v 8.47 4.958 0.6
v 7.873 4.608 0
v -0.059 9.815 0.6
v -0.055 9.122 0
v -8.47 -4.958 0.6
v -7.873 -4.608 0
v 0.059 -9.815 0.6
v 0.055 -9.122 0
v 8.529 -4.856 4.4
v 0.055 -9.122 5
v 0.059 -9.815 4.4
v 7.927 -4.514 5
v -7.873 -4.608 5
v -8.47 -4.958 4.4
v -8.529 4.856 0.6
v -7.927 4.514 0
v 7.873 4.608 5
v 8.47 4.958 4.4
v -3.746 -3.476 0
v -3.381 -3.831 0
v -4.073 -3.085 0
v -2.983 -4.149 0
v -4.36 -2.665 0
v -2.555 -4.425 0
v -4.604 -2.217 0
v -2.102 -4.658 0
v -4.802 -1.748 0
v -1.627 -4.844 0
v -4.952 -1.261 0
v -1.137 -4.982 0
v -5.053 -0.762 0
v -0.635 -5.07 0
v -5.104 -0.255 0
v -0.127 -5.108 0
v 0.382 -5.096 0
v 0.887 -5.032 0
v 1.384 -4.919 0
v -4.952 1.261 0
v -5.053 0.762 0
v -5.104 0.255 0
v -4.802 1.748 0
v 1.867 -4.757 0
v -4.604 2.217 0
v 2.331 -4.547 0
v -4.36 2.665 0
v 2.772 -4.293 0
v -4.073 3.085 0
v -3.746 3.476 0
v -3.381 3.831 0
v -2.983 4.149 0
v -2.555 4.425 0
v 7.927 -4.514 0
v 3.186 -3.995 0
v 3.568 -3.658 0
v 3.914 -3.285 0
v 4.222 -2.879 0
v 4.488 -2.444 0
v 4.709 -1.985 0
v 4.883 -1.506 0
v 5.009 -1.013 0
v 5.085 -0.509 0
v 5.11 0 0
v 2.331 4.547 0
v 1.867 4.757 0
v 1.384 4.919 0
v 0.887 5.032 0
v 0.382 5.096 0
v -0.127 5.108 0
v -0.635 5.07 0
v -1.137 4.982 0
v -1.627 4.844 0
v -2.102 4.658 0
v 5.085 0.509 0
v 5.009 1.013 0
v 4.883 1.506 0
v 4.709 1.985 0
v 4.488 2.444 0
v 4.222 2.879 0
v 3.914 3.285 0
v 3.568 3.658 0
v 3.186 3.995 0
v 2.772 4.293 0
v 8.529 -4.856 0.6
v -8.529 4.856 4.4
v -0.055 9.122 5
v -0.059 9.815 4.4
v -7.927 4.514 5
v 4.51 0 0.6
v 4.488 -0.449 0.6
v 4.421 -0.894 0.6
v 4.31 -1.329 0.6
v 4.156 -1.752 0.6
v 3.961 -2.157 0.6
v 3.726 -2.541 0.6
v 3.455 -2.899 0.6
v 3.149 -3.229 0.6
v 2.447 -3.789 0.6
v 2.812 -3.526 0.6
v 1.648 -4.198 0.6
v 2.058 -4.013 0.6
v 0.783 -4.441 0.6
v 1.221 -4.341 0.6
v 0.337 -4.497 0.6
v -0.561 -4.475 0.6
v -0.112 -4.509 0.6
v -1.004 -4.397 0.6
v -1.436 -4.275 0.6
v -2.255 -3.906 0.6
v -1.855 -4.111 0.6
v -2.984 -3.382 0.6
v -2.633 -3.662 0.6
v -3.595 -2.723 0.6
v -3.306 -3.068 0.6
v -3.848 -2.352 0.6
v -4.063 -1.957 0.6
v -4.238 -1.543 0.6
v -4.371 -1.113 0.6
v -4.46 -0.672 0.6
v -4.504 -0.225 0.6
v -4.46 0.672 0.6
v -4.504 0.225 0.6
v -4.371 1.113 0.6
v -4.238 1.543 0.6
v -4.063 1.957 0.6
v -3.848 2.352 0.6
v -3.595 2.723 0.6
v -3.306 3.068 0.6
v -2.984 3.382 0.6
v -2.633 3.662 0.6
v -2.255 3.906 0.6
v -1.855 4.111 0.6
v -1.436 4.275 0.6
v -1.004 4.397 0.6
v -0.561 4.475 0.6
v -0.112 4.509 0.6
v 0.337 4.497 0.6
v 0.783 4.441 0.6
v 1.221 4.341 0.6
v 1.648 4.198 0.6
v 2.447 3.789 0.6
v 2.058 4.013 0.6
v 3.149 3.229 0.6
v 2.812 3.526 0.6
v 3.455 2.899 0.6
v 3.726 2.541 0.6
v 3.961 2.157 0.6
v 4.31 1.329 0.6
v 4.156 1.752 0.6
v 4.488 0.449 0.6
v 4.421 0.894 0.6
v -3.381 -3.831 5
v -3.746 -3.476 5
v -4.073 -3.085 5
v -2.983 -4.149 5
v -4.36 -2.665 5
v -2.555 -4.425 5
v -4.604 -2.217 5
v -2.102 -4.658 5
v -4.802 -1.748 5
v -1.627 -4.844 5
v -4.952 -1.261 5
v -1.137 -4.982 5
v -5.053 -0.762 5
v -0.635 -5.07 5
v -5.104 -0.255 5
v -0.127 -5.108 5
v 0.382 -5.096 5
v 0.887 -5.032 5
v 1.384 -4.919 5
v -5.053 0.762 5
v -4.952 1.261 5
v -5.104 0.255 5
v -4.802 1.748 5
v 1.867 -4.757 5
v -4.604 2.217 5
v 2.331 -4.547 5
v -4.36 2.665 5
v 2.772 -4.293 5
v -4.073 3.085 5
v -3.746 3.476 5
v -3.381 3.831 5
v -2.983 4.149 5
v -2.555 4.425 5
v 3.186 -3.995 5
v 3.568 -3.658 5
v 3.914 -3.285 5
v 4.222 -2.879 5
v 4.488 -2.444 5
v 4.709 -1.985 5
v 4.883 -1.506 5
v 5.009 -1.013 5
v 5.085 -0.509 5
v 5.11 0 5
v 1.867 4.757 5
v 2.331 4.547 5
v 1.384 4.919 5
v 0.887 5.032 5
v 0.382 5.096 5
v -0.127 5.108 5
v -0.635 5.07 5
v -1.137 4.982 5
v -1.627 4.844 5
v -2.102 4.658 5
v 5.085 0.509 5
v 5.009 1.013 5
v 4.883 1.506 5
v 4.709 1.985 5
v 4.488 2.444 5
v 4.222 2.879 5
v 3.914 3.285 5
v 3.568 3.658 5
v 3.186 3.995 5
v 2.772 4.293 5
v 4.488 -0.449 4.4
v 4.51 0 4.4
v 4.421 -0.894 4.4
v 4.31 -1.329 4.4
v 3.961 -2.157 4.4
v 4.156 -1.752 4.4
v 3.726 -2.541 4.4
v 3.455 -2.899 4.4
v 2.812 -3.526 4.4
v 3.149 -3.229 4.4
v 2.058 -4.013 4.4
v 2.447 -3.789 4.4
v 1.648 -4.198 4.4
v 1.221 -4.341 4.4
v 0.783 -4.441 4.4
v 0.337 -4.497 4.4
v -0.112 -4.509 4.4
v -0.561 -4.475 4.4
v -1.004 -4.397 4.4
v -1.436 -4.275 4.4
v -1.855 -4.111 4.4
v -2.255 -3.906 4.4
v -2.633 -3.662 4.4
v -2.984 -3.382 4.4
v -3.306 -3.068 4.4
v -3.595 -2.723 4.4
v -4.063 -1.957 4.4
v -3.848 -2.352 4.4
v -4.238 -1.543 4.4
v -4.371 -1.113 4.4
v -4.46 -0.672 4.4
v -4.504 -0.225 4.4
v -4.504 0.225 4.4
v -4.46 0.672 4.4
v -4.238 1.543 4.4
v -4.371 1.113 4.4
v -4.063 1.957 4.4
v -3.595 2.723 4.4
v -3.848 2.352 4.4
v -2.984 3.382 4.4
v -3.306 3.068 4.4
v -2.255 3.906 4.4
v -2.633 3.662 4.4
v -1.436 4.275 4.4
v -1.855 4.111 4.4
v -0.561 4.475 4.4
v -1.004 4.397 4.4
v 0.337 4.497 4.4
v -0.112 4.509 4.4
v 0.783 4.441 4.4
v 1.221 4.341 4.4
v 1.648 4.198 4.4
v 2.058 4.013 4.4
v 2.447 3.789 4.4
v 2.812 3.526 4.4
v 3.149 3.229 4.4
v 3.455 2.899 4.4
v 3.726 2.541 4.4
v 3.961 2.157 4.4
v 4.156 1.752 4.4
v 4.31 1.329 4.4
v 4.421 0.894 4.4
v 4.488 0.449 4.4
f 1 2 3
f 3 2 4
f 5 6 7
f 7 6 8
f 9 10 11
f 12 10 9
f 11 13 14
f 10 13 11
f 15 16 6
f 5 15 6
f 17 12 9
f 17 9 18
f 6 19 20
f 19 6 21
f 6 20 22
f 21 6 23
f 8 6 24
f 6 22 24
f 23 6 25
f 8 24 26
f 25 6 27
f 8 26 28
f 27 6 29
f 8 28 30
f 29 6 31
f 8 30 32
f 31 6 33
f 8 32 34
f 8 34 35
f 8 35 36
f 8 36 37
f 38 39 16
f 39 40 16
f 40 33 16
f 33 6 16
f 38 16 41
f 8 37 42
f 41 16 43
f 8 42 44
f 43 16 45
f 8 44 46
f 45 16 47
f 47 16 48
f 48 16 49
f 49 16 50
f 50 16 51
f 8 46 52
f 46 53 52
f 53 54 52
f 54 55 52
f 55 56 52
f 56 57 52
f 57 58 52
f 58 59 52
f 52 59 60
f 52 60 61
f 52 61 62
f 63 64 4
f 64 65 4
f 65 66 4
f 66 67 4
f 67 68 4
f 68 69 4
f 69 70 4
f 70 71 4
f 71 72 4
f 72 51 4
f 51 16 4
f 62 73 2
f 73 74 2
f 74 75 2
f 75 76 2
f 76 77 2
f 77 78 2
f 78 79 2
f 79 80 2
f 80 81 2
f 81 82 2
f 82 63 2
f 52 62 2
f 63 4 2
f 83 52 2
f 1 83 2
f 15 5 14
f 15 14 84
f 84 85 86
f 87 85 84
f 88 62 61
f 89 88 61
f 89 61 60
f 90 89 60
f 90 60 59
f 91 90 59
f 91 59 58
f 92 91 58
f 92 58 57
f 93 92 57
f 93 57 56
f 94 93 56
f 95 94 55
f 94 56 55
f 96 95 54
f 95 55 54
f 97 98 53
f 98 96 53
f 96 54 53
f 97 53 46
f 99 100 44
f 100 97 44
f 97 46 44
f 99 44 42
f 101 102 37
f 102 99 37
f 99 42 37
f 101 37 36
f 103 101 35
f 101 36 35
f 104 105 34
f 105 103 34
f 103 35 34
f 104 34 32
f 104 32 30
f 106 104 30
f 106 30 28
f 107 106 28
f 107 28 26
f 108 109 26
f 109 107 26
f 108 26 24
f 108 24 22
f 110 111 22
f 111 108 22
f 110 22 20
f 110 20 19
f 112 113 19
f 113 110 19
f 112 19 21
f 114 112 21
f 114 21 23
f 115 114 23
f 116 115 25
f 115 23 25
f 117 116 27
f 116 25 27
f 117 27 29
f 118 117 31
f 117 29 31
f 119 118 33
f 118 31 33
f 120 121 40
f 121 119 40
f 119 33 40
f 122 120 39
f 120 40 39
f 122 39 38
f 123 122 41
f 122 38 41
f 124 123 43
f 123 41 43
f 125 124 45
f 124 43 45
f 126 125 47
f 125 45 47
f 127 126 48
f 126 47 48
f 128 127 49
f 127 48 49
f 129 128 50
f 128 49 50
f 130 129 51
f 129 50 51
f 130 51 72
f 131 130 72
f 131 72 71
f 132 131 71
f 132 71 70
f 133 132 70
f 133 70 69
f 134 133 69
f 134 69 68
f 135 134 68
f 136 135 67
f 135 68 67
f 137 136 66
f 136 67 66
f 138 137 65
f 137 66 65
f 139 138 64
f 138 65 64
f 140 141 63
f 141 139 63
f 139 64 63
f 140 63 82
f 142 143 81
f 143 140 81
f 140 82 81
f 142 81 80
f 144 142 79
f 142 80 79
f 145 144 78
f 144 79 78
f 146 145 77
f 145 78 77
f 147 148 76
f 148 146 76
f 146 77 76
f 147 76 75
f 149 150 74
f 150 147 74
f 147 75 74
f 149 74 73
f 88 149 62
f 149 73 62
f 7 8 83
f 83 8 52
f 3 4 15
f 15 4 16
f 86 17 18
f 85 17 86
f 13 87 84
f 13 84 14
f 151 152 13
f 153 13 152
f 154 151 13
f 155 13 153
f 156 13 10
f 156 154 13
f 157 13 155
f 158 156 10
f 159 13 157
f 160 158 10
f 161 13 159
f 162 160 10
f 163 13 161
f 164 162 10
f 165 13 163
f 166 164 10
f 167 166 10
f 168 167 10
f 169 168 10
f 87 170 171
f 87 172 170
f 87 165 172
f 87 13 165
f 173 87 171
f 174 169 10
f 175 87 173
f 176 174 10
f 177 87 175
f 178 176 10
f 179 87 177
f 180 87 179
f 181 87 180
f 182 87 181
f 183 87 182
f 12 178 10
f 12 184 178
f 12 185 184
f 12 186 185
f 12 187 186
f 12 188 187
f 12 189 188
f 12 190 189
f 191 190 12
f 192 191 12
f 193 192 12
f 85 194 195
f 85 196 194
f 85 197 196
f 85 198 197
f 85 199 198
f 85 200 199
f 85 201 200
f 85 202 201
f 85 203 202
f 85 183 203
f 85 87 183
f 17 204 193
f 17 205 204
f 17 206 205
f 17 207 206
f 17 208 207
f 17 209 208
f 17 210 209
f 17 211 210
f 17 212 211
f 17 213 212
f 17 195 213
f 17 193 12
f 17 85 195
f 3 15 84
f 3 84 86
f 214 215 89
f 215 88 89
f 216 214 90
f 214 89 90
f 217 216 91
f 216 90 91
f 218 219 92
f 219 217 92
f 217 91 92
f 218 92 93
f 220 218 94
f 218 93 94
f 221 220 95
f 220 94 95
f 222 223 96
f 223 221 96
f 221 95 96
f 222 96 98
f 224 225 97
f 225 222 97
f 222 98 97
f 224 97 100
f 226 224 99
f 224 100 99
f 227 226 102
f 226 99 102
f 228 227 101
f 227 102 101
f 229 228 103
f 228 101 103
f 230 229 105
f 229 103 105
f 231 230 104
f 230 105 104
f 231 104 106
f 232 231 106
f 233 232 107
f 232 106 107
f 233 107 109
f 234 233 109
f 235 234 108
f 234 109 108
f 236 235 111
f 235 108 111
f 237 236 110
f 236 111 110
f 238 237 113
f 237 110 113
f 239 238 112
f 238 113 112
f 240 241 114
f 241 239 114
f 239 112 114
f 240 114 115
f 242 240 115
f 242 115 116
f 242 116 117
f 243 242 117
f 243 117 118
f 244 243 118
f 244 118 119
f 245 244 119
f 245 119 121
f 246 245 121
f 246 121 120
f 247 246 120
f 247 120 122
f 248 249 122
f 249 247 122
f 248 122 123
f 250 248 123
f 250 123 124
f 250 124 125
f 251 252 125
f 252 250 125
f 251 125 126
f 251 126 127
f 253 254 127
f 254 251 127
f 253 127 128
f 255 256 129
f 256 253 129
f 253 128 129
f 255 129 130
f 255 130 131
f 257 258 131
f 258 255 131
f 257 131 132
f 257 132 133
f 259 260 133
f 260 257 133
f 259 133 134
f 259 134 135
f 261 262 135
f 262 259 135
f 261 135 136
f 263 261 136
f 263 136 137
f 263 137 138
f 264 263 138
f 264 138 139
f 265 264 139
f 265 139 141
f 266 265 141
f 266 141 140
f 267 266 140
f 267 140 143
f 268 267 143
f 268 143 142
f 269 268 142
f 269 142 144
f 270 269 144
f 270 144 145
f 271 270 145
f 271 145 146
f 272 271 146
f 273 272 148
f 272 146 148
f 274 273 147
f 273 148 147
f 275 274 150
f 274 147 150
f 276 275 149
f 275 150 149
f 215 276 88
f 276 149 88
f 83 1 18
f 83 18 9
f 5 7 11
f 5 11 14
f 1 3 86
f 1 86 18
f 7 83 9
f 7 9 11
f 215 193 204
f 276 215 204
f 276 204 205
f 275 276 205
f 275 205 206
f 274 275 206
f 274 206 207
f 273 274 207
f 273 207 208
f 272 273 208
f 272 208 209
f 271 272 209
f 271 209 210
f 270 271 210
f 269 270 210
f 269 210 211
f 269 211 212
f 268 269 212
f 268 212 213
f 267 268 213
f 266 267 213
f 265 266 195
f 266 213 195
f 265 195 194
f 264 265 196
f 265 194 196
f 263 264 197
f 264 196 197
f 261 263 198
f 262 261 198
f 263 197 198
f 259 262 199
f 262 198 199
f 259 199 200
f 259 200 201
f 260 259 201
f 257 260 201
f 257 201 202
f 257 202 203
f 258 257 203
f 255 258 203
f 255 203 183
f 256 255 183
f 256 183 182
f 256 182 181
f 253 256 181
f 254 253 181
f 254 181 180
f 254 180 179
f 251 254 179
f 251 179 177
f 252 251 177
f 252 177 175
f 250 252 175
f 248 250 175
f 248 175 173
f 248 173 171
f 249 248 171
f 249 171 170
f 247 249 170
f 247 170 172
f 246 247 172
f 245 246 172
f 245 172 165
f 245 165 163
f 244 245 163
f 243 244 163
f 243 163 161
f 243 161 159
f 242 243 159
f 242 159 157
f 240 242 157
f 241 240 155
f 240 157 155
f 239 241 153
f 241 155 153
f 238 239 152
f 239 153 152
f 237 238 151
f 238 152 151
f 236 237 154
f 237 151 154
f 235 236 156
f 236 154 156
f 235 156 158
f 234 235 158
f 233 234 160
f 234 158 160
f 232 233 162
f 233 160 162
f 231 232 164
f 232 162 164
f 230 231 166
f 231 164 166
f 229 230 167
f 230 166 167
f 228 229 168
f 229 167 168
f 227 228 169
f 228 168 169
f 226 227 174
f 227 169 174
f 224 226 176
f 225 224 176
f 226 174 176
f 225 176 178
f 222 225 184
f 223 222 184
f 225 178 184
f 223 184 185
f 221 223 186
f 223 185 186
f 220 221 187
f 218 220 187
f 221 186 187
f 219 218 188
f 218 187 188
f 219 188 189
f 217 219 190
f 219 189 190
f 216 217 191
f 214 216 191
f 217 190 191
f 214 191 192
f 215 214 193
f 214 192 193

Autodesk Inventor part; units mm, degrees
ref_plane "YZ Plane" through (0, 0, 0) normal (1, 0, 0) x (0, 1, 0)
ref_plane "XZ Plane" through (0, 0, 0) normal (0, 1, 0) x (-1, 0, 0)
ref_plane "XY Plane" through (0, 0, 0) normal (0, 0, 1) x (1, 0, 0)
sketch "Sketch1" plane through (0, 0, 0) normal (0, 0, 1) x (1, 0, 0)
  circle A0 centre (0, 0) radius 4.51
  line L0 (-0.0588, 9.8148) -> (8.4705, 4.9583)
  line L1 (8.4705, 4.9583) -> (8.5292, -4.8565)
  line L2 (8.5292, -4.8565) -> (0.0588, -9.8148)
  line L3 (0.0588, -9.8148) -> (-8.4705, -4.9583)
  line L4 (-8.4705, -4.9583) -> (-8.5292, 4.8565)
  line L5 (-8.5292, 4.8565) -> (-0.0588, 9.8148)
  dimension "d0" = 9.02
  dimension "d1" = 8.5
extrude "Extrusion1" add sketch "Sketch1" along normal blind 5
chamfer "Chamfer1" distance 0.6 angle 45 14 edges at (-4.294, 7.3356, 5) (-8.4998, -0.0509, 5) (-4.2058, -7.3865, 5) (4.294, -7.3356, 5) (8.4998, 0.0509, 5) (4.2058, 7.3865, 5) (-4.2058, -7.3865, 0) (4.294, -7.3356, 0) (8.4998, 0.0509, 0) (4.2058, 7.3865, 0) (-4.294, 7.3356, 0) (-8.4998, -0.0509, 0) (-4.51, 0, 5) (-4.51, 0, 0)
properties part number "TuercaManzana" material "Steel"
